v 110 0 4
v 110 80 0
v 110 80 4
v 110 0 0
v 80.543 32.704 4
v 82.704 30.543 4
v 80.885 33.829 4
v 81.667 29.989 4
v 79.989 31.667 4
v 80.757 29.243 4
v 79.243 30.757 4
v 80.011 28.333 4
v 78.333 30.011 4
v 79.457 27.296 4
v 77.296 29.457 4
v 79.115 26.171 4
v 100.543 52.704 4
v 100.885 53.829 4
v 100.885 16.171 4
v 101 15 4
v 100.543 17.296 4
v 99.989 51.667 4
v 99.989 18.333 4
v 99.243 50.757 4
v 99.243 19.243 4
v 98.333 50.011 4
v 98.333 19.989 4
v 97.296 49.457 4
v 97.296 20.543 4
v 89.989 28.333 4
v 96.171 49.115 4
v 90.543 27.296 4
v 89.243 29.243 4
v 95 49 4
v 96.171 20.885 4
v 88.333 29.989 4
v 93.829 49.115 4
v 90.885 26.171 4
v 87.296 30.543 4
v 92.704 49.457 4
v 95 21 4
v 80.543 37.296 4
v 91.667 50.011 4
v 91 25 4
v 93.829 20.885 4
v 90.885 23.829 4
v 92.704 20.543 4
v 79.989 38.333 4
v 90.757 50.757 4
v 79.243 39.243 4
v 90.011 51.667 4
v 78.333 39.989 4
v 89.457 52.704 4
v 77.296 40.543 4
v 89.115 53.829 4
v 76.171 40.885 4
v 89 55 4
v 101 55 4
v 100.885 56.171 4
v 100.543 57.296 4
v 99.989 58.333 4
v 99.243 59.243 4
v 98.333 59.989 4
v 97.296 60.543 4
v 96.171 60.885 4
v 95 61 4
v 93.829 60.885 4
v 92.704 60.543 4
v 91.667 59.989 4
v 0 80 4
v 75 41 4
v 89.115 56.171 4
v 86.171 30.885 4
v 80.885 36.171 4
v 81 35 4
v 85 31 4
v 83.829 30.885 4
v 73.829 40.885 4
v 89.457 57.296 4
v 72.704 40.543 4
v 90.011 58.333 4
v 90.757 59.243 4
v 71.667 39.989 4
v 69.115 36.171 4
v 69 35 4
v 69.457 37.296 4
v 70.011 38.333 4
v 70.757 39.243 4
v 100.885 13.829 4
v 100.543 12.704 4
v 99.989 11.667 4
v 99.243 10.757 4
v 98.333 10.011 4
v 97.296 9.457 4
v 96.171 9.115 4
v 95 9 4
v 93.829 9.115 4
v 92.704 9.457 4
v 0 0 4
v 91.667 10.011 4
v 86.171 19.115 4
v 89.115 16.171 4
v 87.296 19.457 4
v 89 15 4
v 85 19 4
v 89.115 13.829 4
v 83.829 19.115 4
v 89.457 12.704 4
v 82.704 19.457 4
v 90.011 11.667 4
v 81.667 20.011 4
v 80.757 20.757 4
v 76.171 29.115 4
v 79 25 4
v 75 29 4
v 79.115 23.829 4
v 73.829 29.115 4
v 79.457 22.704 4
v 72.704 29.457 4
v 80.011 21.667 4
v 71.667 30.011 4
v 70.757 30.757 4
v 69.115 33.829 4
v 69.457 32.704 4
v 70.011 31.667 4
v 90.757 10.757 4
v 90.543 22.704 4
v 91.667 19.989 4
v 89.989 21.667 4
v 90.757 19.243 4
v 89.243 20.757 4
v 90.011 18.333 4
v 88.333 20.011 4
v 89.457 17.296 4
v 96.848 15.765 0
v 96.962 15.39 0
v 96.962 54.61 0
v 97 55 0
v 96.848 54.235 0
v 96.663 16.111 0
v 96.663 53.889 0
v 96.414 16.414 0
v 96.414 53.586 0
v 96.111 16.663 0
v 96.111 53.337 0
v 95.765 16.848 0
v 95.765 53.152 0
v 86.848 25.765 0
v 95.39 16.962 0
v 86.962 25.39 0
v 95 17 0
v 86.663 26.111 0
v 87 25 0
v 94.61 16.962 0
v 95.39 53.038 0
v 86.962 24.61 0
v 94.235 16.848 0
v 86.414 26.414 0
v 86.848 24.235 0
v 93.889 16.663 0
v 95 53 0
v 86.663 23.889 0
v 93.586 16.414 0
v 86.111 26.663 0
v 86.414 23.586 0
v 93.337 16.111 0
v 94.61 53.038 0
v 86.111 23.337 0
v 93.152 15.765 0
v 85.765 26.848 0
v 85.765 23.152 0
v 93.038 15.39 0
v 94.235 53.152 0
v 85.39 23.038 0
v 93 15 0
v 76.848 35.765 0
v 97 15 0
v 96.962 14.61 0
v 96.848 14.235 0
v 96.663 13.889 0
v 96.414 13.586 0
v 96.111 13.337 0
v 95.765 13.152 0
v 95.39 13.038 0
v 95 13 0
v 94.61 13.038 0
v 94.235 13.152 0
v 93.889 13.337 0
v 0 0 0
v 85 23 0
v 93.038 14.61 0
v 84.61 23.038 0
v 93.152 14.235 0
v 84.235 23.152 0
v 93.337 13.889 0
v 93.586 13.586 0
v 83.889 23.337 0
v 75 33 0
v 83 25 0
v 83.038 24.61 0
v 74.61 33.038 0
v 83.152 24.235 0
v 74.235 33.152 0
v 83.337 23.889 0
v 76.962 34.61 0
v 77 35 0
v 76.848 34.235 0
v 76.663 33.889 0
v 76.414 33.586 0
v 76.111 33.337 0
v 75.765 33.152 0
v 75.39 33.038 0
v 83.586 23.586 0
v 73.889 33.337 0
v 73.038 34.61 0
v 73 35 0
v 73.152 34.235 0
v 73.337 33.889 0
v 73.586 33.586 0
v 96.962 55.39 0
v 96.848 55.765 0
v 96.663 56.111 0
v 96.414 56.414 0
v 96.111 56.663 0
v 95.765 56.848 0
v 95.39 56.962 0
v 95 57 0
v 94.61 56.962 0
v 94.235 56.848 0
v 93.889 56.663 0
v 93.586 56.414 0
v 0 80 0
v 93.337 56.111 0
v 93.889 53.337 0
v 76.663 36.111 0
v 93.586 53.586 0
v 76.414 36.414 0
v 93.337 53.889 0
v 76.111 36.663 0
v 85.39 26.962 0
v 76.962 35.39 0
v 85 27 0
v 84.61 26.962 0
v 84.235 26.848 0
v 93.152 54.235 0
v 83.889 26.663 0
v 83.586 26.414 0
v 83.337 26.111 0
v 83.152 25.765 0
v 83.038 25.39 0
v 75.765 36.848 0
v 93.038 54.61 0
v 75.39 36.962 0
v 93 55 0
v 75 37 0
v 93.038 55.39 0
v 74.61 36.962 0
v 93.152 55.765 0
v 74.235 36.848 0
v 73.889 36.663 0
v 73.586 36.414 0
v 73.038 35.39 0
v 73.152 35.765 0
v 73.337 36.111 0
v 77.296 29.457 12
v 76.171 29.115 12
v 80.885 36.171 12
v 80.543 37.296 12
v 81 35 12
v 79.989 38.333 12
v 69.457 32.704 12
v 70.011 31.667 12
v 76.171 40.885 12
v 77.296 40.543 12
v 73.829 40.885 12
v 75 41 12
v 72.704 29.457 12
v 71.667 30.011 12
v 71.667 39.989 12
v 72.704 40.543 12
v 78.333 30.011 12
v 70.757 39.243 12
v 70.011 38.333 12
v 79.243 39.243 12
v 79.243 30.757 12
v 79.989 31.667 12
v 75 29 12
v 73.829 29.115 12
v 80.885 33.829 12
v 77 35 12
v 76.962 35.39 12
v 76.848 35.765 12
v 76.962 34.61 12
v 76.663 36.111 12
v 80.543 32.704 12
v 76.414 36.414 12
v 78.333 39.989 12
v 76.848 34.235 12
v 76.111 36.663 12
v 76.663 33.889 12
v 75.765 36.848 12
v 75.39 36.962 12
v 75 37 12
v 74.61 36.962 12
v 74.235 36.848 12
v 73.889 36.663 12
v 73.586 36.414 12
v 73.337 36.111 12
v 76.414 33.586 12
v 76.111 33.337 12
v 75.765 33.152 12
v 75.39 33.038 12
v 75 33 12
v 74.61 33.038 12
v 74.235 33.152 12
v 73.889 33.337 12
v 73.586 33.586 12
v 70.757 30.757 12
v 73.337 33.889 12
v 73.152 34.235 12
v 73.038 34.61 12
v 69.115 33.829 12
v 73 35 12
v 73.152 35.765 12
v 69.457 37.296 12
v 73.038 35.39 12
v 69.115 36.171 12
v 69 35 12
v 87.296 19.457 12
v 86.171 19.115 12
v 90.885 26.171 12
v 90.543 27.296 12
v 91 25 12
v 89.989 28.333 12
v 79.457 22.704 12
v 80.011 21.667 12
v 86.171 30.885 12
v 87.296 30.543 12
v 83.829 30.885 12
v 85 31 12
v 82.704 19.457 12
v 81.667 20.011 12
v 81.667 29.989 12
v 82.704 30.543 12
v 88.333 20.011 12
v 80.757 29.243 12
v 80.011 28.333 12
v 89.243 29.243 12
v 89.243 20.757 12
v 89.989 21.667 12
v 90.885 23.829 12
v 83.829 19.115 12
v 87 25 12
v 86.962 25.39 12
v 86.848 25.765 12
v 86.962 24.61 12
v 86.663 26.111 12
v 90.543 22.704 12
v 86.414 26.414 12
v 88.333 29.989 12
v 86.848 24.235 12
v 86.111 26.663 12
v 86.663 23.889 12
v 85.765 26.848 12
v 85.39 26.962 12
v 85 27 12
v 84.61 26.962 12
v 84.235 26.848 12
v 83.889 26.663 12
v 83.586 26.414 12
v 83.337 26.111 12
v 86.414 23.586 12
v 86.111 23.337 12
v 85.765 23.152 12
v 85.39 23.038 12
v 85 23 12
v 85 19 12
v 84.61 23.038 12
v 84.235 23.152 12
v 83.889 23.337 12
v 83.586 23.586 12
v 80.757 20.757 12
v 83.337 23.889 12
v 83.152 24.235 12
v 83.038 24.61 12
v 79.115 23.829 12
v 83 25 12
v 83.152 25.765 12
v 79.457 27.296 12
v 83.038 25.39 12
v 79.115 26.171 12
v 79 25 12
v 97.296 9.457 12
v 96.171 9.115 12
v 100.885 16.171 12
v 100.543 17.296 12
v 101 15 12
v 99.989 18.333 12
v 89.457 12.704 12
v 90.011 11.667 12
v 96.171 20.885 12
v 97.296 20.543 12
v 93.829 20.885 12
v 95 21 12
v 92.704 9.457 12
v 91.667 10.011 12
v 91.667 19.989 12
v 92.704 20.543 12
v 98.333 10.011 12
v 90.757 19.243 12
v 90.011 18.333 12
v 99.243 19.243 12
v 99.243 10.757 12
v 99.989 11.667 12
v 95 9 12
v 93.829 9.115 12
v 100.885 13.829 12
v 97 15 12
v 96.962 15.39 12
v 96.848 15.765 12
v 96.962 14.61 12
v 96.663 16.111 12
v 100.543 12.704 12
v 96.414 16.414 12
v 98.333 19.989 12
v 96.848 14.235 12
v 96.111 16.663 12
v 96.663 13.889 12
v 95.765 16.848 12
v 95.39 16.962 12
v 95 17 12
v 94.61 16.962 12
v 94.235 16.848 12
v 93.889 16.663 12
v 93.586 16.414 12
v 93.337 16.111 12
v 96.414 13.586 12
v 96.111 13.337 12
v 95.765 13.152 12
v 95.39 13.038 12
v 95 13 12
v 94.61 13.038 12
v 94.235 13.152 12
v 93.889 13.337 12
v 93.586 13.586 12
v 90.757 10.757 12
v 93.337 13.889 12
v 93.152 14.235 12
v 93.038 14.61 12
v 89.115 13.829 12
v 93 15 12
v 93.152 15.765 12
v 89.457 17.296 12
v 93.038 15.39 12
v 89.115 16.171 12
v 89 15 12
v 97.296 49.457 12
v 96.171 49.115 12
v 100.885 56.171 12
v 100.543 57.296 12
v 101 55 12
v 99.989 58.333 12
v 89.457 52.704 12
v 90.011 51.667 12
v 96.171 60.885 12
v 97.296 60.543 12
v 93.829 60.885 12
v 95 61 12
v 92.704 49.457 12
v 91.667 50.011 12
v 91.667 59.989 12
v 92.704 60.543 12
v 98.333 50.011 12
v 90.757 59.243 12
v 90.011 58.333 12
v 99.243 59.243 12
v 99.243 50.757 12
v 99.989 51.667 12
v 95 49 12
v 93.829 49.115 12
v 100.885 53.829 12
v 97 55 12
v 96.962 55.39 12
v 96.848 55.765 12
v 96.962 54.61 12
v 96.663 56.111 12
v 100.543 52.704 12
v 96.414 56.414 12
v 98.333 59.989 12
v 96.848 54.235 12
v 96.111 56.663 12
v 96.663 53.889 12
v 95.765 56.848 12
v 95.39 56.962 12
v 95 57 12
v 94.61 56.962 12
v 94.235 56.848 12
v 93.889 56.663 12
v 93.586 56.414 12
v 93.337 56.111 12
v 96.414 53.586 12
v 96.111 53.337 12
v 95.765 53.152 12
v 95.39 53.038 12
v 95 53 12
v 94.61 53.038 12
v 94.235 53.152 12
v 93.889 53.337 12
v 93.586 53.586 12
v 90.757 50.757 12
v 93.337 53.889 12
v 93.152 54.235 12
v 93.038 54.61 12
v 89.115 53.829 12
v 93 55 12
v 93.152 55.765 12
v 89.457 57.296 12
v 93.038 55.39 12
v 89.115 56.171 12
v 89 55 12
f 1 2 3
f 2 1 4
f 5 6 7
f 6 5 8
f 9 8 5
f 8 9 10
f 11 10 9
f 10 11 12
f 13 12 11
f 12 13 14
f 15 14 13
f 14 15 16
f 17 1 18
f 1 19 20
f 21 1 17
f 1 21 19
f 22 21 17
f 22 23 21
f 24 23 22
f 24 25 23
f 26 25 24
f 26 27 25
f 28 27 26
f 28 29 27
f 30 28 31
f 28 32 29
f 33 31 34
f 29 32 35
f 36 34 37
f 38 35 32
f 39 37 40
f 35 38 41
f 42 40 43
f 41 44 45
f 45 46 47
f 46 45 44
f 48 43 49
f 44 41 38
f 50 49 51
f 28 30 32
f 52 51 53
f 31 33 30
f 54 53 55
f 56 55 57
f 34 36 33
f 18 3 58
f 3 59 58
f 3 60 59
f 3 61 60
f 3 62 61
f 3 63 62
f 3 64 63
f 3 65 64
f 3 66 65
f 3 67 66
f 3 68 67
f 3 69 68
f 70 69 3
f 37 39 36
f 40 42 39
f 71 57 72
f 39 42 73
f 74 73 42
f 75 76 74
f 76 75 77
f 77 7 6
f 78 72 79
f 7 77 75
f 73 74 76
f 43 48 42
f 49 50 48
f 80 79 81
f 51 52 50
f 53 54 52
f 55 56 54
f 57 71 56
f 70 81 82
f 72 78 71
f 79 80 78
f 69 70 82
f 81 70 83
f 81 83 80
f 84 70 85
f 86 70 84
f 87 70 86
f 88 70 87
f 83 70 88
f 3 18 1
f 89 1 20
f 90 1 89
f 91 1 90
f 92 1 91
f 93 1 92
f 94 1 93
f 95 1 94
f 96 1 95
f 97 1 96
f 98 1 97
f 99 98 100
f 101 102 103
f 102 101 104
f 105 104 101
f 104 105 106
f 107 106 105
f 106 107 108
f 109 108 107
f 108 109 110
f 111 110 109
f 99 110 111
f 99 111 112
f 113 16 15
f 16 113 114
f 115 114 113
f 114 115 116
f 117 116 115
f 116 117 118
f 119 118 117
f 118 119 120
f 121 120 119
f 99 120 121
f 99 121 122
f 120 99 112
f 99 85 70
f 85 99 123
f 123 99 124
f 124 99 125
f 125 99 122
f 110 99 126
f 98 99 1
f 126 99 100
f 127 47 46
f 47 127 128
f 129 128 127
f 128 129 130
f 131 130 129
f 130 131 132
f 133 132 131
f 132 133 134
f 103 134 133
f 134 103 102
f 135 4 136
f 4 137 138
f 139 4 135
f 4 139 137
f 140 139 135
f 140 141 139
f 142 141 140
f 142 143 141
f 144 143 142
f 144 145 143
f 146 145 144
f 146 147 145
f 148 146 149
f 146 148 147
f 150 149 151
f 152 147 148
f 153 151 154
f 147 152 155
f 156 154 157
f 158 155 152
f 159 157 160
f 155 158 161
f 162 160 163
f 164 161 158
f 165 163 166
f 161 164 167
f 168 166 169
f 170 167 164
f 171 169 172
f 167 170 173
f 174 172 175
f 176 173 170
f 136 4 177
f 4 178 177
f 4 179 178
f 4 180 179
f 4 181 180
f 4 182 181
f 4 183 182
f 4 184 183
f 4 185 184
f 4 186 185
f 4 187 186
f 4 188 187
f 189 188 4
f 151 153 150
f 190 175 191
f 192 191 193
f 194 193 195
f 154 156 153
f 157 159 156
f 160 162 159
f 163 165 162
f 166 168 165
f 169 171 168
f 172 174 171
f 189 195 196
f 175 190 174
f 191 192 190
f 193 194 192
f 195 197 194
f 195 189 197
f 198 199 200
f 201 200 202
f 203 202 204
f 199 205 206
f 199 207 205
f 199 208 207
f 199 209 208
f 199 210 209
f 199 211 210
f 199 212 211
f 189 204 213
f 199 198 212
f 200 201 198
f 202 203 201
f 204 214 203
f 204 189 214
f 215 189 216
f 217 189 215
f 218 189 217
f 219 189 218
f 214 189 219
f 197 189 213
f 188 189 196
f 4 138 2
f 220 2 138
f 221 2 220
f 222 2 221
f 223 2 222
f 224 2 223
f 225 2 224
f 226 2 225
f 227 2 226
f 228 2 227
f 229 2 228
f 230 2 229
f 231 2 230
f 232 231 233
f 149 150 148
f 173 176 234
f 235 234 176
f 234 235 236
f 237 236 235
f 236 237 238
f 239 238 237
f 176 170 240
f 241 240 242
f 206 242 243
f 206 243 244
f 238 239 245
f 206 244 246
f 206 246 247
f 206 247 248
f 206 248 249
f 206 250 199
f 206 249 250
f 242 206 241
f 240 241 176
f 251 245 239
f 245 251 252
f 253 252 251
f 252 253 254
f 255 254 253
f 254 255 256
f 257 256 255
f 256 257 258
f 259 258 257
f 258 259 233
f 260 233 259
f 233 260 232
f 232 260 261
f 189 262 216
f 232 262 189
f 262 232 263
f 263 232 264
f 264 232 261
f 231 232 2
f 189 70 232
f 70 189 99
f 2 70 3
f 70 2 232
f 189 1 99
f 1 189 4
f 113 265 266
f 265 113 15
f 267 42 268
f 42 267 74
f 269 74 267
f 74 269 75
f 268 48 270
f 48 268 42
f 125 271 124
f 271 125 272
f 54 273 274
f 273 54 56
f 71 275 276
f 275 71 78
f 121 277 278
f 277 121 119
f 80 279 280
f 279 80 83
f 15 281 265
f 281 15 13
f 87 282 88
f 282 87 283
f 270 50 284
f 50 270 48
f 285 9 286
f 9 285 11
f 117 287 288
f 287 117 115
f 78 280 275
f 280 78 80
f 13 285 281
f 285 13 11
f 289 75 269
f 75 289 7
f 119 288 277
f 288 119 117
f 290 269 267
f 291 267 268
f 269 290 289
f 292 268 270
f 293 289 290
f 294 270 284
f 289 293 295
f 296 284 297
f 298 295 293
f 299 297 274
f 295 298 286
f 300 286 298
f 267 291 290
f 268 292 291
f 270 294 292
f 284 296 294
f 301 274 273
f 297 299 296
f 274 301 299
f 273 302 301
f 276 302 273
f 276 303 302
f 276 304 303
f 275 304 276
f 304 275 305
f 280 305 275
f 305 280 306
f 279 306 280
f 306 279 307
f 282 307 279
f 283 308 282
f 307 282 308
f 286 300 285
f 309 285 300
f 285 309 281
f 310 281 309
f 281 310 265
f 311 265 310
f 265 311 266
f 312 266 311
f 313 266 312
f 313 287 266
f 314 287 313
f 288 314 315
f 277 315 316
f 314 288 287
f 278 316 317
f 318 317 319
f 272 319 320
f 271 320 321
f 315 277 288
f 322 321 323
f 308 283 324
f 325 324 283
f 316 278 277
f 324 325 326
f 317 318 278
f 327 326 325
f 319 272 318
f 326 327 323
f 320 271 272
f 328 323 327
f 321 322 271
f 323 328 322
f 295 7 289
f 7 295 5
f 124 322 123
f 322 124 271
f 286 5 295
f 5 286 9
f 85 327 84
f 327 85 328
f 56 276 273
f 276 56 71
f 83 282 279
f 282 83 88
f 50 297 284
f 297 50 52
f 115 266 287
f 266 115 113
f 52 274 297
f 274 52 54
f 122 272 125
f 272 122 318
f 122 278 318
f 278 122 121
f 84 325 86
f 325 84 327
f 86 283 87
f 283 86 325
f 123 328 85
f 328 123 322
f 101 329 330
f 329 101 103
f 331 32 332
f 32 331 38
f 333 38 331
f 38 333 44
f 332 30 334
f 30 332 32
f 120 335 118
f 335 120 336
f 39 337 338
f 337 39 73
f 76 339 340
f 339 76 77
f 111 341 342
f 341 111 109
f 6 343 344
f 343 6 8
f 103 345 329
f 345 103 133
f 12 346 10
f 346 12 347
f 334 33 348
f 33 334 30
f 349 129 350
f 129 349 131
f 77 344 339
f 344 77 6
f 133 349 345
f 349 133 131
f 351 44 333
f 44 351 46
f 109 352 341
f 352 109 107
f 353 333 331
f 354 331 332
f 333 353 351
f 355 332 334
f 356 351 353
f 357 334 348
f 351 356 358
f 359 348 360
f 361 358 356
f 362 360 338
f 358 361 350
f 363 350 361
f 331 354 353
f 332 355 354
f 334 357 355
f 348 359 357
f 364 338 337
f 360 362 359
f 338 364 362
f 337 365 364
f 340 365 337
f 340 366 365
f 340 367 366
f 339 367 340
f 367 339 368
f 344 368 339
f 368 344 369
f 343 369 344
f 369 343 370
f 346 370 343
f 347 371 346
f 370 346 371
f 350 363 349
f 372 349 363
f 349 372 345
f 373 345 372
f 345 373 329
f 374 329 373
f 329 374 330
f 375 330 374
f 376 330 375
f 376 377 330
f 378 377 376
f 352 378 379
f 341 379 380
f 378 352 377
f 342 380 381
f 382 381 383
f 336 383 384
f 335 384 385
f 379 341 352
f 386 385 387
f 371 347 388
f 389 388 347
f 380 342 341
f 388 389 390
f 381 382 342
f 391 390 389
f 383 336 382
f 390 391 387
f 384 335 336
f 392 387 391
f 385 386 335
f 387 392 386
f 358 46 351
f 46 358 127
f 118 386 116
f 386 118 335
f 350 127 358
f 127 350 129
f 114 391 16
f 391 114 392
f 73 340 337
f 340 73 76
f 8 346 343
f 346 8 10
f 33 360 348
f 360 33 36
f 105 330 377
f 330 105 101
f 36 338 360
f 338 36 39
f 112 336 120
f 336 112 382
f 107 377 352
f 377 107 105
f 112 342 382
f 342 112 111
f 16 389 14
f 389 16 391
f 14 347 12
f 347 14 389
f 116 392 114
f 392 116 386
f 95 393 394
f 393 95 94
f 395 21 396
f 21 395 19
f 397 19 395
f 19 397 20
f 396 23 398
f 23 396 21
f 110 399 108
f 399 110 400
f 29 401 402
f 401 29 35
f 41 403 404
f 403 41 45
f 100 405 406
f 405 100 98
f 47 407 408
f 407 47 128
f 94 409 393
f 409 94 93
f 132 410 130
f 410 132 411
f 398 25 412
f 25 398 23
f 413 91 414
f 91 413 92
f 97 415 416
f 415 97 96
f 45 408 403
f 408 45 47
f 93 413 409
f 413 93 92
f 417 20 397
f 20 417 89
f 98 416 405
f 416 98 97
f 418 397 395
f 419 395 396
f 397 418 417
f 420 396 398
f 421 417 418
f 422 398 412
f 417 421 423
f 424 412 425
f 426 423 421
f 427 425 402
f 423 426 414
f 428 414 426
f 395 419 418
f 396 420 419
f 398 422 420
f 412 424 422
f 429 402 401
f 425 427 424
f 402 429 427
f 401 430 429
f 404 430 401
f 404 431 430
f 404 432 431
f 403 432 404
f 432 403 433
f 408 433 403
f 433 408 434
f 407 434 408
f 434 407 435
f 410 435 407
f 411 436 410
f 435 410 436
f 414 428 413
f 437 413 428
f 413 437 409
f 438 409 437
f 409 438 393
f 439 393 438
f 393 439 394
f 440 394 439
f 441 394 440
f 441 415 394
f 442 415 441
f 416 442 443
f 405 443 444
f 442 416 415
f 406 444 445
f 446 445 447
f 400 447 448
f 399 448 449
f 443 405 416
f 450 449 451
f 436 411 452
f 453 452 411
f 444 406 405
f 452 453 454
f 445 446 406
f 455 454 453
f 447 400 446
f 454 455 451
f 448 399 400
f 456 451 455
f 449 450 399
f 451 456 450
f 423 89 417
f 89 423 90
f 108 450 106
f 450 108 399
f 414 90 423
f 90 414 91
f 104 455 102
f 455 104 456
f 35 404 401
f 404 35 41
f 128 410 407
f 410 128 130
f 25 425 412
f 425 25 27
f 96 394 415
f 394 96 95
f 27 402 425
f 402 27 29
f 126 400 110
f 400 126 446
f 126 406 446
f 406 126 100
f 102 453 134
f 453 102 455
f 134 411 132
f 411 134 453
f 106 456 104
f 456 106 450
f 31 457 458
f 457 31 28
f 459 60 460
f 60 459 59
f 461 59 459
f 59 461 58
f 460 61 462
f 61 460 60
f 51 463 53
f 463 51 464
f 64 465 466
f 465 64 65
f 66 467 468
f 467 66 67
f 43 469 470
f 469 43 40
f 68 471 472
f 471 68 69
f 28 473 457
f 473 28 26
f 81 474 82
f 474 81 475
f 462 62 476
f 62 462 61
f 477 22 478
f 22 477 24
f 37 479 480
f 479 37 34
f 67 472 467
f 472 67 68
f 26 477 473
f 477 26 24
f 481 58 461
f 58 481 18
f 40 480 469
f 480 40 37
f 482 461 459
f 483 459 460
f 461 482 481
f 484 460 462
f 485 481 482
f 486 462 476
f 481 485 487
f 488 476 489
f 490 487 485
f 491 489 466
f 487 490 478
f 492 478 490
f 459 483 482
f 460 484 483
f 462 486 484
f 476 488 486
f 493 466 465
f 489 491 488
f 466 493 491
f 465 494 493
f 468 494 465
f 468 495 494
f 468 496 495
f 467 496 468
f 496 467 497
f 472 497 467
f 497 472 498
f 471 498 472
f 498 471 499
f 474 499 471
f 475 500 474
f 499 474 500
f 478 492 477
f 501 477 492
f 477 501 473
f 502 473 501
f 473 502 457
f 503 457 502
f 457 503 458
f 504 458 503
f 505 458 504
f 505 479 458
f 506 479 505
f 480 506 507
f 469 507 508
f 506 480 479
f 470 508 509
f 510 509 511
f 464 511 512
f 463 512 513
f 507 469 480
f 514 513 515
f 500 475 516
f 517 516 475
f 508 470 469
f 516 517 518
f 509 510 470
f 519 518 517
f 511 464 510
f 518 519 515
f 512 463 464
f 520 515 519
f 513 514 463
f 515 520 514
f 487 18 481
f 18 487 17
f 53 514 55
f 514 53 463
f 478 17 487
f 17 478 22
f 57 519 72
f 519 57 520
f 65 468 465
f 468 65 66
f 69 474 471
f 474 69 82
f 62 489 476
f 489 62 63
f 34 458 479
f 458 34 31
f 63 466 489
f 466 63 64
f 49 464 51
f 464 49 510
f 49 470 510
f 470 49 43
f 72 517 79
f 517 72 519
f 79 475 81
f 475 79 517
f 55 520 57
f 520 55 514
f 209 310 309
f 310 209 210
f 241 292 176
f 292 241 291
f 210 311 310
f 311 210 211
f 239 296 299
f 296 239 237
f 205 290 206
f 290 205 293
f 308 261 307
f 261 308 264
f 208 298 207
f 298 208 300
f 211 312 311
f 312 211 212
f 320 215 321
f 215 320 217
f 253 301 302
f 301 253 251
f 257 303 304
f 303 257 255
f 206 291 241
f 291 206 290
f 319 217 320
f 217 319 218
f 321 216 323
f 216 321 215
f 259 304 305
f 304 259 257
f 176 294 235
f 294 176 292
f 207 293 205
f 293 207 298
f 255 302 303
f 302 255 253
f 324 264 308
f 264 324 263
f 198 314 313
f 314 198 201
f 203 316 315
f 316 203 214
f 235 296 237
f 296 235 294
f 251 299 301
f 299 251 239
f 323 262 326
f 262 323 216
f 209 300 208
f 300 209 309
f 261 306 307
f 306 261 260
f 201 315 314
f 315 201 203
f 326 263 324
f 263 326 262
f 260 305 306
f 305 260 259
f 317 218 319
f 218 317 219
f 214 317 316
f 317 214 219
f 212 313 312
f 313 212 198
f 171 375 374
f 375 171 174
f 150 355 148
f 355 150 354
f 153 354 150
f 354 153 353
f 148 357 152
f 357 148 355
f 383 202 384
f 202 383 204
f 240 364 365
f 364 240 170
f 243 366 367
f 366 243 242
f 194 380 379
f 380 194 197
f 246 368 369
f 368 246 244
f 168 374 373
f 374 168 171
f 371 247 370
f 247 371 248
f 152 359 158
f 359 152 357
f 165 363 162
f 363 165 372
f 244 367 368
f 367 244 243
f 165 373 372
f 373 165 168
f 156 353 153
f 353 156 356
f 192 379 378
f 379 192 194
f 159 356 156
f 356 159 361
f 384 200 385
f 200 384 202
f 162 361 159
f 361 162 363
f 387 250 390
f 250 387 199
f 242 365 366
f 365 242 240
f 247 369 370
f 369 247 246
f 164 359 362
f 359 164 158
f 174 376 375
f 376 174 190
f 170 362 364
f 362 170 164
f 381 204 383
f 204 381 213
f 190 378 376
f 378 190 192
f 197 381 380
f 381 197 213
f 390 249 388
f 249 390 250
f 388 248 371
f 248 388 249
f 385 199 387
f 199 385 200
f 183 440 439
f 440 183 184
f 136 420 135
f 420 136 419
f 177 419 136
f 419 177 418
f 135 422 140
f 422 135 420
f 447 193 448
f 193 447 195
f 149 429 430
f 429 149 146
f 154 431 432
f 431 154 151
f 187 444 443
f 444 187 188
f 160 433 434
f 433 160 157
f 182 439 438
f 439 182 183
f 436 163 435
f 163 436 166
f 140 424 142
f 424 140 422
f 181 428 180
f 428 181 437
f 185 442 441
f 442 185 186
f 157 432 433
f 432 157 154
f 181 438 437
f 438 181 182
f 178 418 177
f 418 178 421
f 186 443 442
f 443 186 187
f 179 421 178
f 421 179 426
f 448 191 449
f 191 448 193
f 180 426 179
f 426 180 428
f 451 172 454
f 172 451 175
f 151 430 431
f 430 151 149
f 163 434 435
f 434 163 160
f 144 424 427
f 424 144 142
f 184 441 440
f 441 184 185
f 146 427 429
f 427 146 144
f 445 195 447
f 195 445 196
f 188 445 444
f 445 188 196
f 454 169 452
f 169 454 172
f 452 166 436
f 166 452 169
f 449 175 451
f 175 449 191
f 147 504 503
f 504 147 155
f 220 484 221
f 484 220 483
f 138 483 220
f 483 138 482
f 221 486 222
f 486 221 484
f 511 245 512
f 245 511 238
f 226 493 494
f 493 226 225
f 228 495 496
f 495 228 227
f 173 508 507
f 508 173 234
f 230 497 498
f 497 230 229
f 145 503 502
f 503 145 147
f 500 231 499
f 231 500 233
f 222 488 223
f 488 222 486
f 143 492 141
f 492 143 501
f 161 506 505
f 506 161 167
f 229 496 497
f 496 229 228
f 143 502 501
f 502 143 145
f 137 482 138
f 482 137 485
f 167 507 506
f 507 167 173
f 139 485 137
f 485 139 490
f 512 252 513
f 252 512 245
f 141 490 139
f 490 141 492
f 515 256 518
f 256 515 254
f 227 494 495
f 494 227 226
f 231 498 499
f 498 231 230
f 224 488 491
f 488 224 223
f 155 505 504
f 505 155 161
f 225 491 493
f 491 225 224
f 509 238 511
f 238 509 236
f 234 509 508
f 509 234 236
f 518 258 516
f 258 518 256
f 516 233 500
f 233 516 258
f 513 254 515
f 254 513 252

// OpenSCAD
$fn = 32;

// ----------------------------------------------------------------------
// Boss field: plate with bosses at given coordinates
// ----------------------------------------------------------------------

// --- parameters (mm) ---
plate_l = 110;            // plate length, X
plate_w = 80;             // plate width, Y
plate_t = 4;              // plate thickness, Z
boss_d = 12;              // boss diameter
boss_h = 8;               // boss height above the plate
bore_d = 4;               // boss bore

total_h = plate_t + boss_h;  // overall height

difference() {
  union() {
    cube([plate_l, plate_w, plate_t]);
    translate([75, 35, plate_t]) cylinder(h = boss_h, d = boss_d);
    translate([85, 25, plate_t]) cylinder(h = boss_h, d = boss_d);
    translate([95, 15, plate_t]) cylinder(h = boss_h, d = boss_d);
    translate([95, 55, plate_t]) cylinder(h = boss_h, d = boss_d);
  }
  translate([75, 35, -1]) cylinder(h = total_h + 2, d = bore_d);
  translate([85, 25, -1]) cylinder(h = total_h + 2, d = bore_d);
  translate([95, 15, -1]) cylinder(h = total_h + 2, d = bore_d);
  translate([95, 55, -1]) cylinder(h = total_h + 2, d = bore_d);
}
